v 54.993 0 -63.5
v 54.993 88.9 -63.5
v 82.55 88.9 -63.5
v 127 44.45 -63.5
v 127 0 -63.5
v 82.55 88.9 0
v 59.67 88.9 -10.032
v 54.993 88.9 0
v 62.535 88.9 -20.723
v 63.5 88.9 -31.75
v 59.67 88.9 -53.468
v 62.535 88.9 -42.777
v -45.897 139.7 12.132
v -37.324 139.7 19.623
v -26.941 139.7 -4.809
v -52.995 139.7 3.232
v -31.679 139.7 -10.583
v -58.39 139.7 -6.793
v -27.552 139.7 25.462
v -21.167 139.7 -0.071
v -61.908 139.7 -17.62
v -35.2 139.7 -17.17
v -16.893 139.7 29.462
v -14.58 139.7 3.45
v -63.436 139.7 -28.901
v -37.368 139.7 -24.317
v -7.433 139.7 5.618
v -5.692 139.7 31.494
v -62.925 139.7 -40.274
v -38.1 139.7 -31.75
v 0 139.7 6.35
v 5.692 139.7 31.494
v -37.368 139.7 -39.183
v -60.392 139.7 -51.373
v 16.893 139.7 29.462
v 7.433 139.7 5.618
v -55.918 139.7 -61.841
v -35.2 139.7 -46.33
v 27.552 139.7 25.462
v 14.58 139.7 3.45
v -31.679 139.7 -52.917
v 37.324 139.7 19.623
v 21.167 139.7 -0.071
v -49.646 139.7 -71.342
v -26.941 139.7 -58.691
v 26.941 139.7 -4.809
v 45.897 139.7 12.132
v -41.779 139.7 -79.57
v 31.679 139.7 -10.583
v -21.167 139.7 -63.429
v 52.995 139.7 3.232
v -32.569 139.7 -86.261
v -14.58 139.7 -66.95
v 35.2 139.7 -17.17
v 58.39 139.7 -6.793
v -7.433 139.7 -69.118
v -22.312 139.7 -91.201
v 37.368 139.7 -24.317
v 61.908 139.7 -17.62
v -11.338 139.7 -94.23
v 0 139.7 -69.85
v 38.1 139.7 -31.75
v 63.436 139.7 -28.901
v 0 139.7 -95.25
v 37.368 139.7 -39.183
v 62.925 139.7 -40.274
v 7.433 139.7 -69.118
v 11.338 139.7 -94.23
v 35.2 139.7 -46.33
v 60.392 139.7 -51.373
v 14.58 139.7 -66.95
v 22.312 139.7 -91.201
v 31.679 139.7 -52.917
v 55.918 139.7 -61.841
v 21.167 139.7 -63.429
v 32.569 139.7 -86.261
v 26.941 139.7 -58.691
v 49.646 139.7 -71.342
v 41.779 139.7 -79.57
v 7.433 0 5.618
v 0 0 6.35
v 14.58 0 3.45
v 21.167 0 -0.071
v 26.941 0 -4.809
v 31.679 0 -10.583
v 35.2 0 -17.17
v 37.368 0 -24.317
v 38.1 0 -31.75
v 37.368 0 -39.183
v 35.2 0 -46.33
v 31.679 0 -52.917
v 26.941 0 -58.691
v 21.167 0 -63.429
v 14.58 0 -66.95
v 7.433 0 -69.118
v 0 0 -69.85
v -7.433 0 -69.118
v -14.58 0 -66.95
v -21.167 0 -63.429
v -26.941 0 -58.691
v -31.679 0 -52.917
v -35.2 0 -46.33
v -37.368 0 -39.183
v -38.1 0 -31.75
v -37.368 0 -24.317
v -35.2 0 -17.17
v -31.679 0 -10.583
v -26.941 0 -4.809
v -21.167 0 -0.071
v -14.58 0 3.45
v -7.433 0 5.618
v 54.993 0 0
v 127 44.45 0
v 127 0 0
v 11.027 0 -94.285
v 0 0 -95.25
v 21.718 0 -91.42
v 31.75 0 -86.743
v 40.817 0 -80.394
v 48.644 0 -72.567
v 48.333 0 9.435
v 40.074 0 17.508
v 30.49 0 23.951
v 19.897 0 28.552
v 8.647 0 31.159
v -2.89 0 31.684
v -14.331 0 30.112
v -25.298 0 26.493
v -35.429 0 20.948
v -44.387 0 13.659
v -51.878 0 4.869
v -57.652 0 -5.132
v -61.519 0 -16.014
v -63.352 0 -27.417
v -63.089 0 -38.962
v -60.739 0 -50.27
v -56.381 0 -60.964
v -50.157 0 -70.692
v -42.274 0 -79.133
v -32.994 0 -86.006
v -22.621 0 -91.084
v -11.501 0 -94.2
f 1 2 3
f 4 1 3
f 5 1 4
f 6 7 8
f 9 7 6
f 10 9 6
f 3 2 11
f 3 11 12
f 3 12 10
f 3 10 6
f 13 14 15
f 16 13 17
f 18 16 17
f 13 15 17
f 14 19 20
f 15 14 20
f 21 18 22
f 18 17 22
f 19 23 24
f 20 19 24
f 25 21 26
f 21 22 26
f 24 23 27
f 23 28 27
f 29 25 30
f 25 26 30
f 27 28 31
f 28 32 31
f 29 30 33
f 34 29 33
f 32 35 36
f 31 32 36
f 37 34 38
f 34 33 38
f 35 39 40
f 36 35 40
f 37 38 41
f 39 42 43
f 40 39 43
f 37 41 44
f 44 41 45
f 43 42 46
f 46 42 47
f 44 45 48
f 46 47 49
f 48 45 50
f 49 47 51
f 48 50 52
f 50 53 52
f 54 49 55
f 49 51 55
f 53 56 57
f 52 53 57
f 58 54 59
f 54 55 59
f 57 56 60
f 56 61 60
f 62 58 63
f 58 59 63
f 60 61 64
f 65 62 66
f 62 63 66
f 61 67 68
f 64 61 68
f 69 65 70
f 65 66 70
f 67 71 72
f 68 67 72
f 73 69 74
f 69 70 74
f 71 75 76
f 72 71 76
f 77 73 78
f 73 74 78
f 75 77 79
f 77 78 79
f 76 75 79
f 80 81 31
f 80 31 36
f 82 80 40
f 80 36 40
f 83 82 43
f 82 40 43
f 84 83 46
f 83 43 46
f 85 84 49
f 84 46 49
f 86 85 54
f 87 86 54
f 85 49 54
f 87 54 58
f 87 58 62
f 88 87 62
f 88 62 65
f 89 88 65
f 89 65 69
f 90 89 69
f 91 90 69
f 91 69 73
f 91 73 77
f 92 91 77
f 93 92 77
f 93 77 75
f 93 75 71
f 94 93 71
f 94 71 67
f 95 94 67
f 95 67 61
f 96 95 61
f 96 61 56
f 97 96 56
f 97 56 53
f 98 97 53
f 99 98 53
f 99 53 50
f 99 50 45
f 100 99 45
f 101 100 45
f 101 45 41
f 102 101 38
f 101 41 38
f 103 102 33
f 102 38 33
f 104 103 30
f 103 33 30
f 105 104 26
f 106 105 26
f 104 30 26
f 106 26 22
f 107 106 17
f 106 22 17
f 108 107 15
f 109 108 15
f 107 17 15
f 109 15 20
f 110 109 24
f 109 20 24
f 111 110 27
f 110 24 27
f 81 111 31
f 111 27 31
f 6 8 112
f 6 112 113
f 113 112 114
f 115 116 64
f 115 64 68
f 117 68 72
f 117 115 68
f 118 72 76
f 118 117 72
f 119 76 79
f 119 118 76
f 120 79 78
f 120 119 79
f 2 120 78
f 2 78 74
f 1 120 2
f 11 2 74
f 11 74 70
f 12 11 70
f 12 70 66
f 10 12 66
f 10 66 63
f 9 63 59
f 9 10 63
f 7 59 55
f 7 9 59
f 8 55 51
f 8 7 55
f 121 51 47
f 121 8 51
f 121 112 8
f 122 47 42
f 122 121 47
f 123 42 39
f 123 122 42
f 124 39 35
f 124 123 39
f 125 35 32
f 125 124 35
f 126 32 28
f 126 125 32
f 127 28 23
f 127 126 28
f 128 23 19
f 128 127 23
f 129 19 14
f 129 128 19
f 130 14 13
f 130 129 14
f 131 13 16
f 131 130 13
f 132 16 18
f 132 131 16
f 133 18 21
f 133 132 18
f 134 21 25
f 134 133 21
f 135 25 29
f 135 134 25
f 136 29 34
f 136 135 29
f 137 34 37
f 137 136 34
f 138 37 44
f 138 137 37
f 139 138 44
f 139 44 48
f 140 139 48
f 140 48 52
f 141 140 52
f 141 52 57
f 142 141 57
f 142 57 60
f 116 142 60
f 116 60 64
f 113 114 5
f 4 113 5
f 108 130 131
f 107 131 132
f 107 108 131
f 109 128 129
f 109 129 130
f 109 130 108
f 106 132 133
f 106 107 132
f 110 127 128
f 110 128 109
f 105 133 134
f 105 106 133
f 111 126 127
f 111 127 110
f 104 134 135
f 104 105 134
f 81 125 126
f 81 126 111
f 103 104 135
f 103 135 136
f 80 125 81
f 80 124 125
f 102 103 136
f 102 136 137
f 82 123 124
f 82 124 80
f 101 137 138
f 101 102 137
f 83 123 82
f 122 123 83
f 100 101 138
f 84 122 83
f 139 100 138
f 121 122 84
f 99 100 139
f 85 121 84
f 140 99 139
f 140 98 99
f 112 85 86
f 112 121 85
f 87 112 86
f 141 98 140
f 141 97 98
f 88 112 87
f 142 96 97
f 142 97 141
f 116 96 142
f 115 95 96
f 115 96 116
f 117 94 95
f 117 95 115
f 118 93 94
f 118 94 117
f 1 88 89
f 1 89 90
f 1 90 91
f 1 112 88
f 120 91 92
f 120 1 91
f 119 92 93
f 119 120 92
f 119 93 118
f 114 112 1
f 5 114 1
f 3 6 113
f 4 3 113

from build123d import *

# Parameters (mm, degrees)
SKETCH1_W           = 127
SKETCH1_H           = 63.5
BOSS_EXTRUDE1_DEPTH = 88.9
SKETCH3_R           = 63.5
BOSS_EXTRUDE2_DEPTH = 139.7
CUT_EXTRUDE1_REACH  = 213.465
CUT_EXTRUDE2_REACH  = 213.465
SKETCH5_R           = 38.1


with BuildPart() as part:
    # Sketch1 → Boss-Extrude1 (new body)
    with BuildSketch(Plane(origin=(0, 0, 0), x_dir=(1, 0, 0), z_dir=(0, 1, 0))):
        with Locations((63.5, 31.75)):
            Rectangle(SKETCH1_W, SKETCH1_H)
    extrude(amount=BOSS_EXTRUDE1_DEPTH)

    # Sketch3 → Boss-Extrude2 (add)
    with BuildSketch(Plane.XZ):
        with Locations(Location((0, -31.75, 0), (0, 0, 270))):
            Circle(SKETCH3_R)
    extrude(amount=-BOSS_EXTRUDE2_DEPTH)

    # Sketch4 → Cut-Extrude1 (cut, up to next)
    with BuildSketch(Plane.XY, mode=Mode.PRIVATE) as cut_extrude1_sk1:
        Polygon((82.55, 88.9), (127, 44.45), (127, 88.9), align=None)
    cut_extrude1_tool1 = extrude(cut_extrude1_sk1.sketch, amount=-CUT_EXTRUDE1_REACH, mode=Mode.PRIVATE) & part.part
    add(cut_extrude1_tool1.solids().sort_by_distance((112.183333, 74.083333, 0))[0], mode=Mode.SUBTRACT)

    # Sketch5 → Cut-Extrude2 (cut, up to next)
    with BuildSketch(Plane(origin=(0, 139.7, 0), x_dir=(1, 0, 0), z_dir=(0, 1, 0)), mode=Mode.PRIVATE) as cut_extrude2_sk1:
        with Locations(Location((0, 31.75, 0), (0, 0, 270))):
            Circle(SKETCH5_R)
    cut_extrude2_tool1 = extrude(cut_extrude2_sk1.sketch, amount=-CUT_EXTRUDE2_REACH, mode=Mode.PRIVATE) & part.part
    add(cut_extrude2_tool1.solids().sort_by_distance((0, 139.7, -31.75))[0], mode=Mode.SUBTRACT)


solid = part.part
